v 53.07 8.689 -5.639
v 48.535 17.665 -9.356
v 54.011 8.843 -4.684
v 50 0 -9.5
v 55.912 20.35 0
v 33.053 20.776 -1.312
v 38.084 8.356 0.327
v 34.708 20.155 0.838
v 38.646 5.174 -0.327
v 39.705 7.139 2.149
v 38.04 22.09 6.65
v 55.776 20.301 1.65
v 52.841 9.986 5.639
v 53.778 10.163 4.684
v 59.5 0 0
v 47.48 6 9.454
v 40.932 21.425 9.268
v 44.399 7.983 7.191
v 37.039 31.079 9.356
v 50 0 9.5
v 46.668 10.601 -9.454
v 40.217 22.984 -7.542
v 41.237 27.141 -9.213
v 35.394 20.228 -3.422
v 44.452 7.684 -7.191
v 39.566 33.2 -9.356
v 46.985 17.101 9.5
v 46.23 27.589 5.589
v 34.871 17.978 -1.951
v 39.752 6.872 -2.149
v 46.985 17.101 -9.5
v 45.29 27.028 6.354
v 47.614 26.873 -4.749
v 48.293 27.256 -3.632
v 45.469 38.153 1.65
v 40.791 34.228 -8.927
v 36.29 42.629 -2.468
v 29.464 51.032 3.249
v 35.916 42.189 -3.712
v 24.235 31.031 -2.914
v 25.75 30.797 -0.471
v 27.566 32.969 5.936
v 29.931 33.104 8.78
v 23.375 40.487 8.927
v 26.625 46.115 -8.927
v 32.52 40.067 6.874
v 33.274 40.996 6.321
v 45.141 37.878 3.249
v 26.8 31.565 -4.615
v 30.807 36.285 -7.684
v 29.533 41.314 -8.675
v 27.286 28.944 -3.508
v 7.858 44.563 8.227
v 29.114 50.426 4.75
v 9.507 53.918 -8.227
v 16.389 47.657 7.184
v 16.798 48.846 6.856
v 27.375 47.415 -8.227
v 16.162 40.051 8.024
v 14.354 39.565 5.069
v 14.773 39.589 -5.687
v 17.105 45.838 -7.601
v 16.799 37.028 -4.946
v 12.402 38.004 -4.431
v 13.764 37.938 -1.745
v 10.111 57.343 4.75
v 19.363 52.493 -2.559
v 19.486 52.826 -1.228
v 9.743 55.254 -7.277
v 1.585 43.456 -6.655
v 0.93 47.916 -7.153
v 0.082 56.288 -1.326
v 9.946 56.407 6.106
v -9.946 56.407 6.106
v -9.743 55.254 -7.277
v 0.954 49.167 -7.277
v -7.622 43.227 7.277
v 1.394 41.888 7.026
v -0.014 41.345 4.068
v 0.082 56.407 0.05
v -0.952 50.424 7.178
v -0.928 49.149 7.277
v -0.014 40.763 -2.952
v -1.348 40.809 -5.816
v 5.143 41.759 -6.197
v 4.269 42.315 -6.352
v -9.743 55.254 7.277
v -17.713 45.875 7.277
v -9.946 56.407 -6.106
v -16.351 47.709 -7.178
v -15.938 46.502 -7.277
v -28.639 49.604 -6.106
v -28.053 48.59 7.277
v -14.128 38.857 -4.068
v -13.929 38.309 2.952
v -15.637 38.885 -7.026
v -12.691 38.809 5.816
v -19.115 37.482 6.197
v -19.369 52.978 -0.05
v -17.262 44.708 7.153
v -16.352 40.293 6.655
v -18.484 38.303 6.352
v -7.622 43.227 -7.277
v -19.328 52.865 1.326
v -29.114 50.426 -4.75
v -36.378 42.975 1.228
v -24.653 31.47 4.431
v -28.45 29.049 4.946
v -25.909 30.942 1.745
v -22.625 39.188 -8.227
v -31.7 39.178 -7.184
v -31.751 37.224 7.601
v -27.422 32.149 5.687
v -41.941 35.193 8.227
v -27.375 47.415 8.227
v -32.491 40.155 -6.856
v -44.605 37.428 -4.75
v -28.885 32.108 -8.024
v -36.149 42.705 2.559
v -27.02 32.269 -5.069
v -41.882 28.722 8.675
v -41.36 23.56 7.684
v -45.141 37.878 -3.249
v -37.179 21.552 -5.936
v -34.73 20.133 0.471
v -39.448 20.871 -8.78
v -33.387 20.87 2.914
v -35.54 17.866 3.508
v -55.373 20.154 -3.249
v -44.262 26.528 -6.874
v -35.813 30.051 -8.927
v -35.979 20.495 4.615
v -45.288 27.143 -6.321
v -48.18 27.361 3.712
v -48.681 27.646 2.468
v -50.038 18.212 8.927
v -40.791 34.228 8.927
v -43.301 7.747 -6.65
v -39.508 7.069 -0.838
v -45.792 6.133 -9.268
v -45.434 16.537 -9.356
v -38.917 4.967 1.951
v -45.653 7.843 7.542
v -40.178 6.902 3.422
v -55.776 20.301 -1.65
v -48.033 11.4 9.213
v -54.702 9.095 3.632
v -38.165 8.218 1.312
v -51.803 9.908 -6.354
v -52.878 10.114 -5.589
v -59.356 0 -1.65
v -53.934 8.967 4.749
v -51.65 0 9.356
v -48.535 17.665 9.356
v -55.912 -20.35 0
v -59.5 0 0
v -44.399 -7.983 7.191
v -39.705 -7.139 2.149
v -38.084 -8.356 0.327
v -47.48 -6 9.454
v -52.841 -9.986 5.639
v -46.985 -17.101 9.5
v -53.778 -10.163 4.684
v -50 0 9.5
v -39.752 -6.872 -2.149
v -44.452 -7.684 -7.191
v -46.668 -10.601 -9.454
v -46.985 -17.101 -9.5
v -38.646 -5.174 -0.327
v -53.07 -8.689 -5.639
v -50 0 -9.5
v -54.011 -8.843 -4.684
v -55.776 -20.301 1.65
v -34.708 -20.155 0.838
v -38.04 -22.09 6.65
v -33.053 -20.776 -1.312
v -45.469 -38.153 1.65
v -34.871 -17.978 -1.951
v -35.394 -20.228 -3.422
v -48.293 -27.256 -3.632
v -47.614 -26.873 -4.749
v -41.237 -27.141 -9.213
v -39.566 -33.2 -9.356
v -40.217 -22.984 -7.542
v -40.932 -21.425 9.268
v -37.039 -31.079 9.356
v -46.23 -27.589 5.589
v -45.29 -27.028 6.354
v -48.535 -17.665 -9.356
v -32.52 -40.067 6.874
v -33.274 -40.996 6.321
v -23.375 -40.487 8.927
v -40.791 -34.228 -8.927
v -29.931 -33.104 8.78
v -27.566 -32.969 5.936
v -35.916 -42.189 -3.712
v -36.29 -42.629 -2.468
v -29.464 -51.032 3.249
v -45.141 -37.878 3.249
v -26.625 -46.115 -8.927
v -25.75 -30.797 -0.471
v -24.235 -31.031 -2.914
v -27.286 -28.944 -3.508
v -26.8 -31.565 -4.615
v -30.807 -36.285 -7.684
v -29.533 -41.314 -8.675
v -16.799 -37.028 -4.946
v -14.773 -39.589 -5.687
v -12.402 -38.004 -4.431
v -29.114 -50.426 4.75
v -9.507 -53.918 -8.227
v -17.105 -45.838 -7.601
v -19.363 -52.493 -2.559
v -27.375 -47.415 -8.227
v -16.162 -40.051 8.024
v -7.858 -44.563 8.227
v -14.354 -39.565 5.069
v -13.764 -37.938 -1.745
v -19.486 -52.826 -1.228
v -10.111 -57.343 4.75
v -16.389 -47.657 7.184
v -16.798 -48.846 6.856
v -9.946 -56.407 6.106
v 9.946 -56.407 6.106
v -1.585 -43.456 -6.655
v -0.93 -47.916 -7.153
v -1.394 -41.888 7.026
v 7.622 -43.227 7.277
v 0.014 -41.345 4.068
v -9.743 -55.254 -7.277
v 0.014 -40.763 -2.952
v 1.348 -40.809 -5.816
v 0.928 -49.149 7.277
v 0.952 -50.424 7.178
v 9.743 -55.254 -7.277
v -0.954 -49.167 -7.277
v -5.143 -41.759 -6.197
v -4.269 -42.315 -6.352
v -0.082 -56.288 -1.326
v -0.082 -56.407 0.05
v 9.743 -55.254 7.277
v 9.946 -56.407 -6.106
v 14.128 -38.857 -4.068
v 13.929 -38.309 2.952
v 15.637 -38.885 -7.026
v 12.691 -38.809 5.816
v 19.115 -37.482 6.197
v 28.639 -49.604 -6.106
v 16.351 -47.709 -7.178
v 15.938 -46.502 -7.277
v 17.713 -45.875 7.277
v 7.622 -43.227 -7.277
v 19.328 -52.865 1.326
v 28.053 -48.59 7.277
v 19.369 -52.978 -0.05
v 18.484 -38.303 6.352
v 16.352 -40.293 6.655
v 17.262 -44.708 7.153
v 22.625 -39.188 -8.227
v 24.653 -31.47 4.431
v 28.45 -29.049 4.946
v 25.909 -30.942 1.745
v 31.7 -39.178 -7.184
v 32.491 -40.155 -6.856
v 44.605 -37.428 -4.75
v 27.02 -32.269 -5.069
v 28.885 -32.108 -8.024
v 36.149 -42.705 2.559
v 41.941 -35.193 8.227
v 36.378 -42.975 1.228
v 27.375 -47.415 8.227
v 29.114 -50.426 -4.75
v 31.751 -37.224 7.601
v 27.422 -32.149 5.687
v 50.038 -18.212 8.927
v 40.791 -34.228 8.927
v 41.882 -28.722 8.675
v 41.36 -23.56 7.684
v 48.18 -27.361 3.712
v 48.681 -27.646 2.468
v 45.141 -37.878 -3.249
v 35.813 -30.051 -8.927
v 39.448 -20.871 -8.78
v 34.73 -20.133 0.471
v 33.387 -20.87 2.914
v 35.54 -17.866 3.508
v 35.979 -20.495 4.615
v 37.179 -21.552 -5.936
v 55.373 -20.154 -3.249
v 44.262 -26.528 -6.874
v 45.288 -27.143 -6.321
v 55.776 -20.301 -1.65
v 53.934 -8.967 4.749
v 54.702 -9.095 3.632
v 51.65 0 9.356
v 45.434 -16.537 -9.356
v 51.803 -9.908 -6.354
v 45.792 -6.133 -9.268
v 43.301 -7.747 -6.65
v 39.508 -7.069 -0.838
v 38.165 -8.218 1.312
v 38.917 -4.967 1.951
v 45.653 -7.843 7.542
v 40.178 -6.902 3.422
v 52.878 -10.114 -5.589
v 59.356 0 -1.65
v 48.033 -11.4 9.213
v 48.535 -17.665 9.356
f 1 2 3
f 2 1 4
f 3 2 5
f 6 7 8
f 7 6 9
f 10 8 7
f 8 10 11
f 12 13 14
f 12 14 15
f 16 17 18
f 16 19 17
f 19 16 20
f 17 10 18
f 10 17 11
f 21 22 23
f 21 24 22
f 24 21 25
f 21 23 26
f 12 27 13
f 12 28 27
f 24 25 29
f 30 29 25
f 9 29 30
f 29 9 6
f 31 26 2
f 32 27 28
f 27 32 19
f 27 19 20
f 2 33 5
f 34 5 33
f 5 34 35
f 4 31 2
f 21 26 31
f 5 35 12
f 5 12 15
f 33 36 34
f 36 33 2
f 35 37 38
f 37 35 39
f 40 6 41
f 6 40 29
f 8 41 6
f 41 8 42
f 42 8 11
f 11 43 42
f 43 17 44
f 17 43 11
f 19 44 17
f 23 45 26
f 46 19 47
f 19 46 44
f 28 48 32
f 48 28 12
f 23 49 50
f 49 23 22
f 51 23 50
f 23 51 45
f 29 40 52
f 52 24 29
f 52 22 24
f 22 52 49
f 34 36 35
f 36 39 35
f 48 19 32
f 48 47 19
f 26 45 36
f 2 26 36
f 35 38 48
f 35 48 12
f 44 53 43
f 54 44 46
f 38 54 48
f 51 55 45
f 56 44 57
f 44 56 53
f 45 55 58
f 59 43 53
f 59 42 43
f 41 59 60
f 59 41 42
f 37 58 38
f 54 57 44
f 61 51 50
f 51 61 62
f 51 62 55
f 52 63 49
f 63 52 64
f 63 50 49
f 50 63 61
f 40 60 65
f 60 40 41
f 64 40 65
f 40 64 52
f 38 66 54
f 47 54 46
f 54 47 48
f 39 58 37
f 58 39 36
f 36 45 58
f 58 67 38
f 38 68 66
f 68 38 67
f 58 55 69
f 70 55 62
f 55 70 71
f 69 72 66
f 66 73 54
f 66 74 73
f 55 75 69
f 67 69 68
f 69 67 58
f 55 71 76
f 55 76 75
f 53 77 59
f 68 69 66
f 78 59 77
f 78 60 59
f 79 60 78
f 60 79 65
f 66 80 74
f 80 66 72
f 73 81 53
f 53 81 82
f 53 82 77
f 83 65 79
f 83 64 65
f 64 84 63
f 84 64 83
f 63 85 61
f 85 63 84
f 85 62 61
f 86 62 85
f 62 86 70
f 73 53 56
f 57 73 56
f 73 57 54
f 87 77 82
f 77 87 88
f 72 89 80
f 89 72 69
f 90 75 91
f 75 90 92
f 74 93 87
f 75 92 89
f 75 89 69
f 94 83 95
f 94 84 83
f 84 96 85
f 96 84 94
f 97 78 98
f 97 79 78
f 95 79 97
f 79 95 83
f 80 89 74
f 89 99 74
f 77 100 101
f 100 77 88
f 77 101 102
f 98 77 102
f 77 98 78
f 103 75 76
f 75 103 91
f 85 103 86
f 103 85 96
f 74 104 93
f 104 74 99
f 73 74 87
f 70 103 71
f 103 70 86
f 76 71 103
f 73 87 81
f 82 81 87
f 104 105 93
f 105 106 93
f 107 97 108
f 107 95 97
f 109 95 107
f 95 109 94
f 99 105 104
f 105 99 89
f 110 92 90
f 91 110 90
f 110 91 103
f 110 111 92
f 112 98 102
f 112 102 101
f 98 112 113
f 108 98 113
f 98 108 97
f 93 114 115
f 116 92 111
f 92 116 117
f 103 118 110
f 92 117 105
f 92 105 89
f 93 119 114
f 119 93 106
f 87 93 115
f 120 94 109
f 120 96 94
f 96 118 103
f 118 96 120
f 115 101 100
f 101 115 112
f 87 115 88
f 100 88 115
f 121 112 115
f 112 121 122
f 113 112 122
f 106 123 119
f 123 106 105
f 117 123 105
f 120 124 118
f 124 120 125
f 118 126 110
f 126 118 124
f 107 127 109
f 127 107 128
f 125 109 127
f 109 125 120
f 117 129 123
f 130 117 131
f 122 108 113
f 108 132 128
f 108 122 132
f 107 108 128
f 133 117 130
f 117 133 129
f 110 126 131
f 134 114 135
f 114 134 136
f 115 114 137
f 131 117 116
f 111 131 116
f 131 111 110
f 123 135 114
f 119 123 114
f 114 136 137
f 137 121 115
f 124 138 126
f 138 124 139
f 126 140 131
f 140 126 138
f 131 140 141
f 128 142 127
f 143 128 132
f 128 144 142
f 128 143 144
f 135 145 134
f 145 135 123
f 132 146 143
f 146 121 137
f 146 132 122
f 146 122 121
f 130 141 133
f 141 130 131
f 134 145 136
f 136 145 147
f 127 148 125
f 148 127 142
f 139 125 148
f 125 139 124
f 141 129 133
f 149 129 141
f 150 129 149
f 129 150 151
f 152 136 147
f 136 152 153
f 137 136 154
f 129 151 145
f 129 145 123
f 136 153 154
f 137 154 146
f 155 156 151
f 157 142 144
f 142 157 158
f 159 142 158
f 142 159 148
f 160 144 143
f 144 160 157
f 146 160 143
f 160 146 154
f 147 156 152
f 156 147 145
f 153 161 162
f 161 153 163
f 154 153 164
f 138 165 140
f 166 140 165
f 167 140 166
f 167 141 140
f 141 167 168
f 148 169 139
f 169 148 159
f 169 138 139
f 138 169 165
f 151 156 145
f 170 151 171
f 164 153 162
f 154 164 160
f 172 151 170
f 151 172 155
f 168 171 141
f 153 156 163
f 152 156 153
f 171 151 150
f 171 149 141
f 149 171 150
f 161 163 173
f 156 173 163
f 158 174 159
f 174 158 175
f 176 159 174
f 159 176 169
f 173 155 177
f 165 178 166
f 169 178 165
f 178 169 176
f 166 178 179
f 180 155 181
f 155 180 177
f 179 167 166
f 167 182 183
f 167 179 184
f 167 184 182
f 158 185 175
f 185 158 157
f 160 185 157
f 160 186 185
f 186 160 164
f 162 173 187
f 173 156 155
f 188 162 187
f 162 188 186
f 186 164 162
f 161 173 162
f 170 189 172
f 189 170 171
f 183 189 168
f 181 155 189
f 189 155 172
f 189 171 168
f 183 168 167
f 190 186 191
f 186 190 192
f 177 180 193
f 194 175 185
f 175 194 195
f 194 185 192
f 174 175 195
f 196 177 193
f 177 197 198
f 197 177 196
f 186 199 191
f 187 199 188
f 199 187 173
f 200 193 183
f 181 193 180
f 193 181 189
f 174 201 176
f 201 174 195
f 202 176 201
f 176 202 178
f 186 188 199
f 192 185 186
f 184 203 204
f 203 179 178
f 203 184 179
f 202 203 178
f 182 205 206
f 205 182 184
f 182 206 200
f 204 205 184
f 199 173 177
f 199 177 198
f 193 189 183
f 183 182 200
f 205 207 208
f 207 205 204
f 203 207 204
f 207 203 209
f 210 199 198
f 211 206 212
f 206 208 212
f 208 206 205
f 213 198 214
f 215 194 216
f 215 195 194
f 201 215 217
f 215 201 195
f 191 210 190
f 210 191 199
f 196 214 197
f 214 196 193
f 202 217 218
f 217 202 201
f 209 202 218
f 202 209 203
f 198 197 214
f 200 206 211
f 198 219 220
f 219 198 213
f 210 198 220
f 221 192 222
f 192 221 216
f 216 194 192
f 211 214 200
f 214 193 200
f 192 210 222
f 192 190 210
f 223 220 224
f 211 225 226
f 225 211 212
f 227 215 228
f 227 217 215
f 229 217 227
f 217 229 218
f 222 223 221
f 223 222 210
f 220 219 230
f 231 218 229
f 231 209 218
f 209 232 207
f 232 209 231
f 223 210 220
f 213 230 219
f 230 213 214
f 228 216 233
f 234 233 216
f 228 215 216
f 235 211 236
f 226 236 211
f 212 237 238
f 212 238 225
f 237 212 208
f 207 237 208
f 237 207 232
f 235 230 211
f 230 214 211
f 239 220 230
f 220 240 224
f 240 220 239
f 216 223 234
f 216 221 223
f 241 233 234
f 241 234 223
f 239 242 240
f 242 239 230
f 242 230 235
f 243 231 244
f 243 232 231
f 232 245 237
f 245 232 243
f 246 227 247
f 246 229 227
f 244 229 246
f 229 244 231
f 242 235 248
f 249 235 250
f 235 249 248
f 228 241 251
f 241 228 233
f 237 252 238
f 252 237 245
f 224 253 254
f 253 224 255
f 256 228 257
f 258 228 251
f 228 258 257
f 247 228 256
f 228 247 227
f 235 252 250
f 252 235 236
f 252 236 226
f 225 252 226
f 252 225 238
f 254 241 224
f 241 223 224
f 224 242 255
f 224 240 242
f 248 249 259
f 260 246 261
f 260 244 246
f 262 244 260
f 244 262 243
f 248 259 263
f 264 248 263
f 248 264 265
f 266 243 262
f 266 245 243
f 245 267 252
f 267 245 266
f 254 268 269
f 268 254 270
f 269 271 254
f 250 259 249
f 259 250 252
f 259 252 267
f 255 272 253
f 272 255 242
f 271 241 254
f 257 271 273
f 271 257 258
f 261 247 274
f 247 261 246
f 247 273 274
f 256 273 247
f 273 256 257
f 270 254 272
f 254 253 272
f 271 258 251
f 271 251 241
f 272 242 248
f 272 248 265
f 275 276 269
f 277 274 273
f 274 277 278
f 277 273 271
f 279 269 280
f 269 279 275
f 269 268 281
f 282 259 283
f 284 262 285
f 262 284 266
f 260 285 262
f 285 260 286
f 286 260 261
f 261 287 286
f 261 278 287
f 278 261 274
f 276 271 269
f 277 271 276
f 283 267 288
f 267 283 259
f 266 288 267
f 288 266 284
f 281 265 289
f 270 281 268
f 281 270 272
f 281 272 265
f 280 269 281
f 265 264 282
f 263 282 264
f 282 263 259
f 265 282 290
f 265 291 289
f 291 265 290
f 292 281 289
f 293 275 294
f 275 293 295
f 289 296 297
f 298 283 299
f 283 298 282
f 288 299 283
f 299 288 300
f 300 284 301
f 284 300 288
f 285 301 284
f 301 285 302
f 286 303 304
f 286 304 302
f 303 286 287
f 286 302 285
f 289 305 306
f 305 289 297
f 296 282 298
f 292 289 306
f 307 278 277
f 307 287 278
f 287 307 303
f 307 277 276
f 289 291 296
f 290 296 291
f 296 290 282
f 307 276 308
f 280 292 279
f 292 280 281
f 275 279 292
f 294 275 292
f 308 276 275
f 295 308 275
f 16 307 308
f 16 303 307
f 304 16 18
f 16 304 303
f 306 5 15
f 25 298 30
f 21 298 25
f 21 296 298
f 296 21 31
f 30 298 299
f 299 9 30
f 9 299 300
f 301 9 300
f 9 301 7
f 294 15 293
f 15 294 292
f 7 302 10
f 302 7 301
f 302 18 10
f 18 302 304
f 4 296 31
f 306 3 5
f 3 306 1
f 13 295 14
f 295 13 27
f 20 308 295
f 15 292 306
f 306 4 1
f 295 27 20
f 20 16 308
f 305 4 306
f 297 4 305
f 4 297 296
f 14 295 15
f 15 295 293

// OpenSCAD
/*Polygon-möbius-strip generator by Mixomycetes
*Licence: CC non-commercial
*
* Inspired by Twistypuzzle forum and
* mobius_polygon(n,m)
*
* v1: functional mobius_polygon();
* v2: Used pie library to implement Angle_to_keep_in_STL <360;
* v3: added twisty_puzzle pieces();
* v4: rebuild with steps using children(). Much faster.
* v5: implemented my_pieslice instead of pie;
* v6: smooth output available (hull of every 2 adjencent pieces)
* v7: accepts any 2D polygon as input for rotation. 
* v8: some cleanup.
*******************************
*/

//Number of edges of rotated polygon.
NEdges = 4; //[1:20]

//Number of full twists over one ring turn.Make negative to reverse chirality. n/m fractions possible too
Twists  = 2/4;  
// Diameter of polygon (circumscribed)
Width_strip= 19; 
 // Diameter of total ring
Size_ring = 100; //should be larger than width_strip.

// Angle to print. May need to make multiple rotations (>360), when NEdges/Twist is non-integer.
Angle_to_form_shape = 360; // [0:720]

// Typically 360, smaller if you want to keep only a fraction. Note that it slows things down considerably!
Angle_to_keep_in_STL = 360; // [0:360]
// Angle of polygon at X-axis. Mainly important for Twists =0
Start_angle = 0;

Make_empty_centre_ring = 0; // [1:Yes,0:No]

//FULL centre hole diameter. Should be smaller than Width_strip.
Diameter_hollow_centre =5; 

// Angle-section of each segment
Stepsize=20; 

smoothed = 1; // 1: uses a hull between every 2 items. 0 doesn't. 0 is faster, 1 nicer.
// the lower the faster, but higher means nicer
fn = 5;


/** Begin of program **/
    
//Some simple shapes/features:
//mobius_strip(20,4,0.1);
mobius_polygon(NEdges,Twists,Width_strip,Size_ring,fn,Angle_to_form_shape,Start_angle,Stepsize,Angle_to_keep_in_STL,Make_empty_centre_ring,Diameter_hollow_centre,smoothed);

//rotate_step_by_step(Twists,Stepsize,Angle_to_form_shape,0,20,0,1)ngon(20)
//nparts = 4;
//points = [[0,0],[-1,1],[1,-1],[1,1]]*Width_strip/2;
//georgehart_mobius_centre_v1(nparts,points,TiltAngle=20);

/** Modules **/

module georgehart_mobius_centre_v1(nparts,points,TiltAngle=20){
// n_gon: points = 
CentreAngle = 360/nparts;

union(){
    for (i = [0:nparts-1]){
rotate([0,TiltAngle,i*CentreAngle])translate([0,Size_ring/4,0])  rotate_step_by_step(Twists,1,Angle_to_form_shape,0,Size_ring,1) polygon(points);
};
};
};


module mobius_polygon(NEdges=5,Twists=0,Width_strip=1,Size_ring=10,fn=10,Angle_to_form_shape =360,Start_angle=0,Stepsize=5,Angle_to_keep_in_STL=360,Make_empty_centre_ring=0,Diameter_hollow_centre=0,smoothed=0){
steps_obsolete=Angle_to_form_shape/Stepsize; 
  steps=360/Stepsize; // a step per 5°, faster than per 1°
intersection(){ //keep just a pieslice    
    if (Angle_to_keep_in_STL<360) {
        safetymargin=3; // default 3
   translate([0,0,-Width_strip/2*safetymargin]) mypie(Size_ring/2*safetymargin+Width_strip/2*safetymargin, Width_strip*safetymargin, Angle_to_keep_in_STL, spin=0);
    };
    
difference(){ 
//make main shape
if (NEdges==2){
    thickness = 1;
    // available for backward compatibility    
    mobius_strip(Size_ring/2,Width_strip,thickness,Twists/2,Stepsize,Start_angle);
     };   

    
if (NEdges>2){
                
rotate([0,0,Start_angle]) rotate_step_by_step(Twists,Stepsize,Angle_to_form_shape,smoothed,Size_ring) circle(d=Width_strip,$fn=NEdges);
    };
  
    // cut out centre ring.
if (  Make_empty_centre_ring==1 ){
    rotate_extrude($fn=fn)translate([Size_ring/2,0,0])circle(d=Diameter_hollow_centre,$fn=fn);
};

};
};
};


// some helper functions:
module ngon(diam=10, fn=6){
//rotate([90,0,0])    linear_extrude(thickness)
    circle(d=diam,$fn=fn);
    }; // in XZ-plane, needed positive X for rotate-extrude! => translate([diam,0])


module rotate_step_by_step(Twists=0,Stepsize=5,To_angle=360,smoothed =0,Size_ring=50,From_angle=0){// iterative rotate_extrude of 2D child. (Sv7)
    // Much Faster, but creates more coordinates.
    // children shapes should be within a Size_ring/2 circle.
     // OneStepAngle_wrong =Angle_to_form_shape/Stepsize; // a step per 5°, faster 
        if (smoothed==1)
    for (step = [From_angle:Stepsize:To_angle-Stepsize]){
            hull(){rotate([0,0,step]) rotate_extrude(angle = Stepsize, convexity = 2) translate([Size_ring/2,0,0]) rotate([0,0,step *Twists])       children();
    rotate([0,0,step+Stepsize]) rotate_extrude(angle = Stepsize, convexity = 2) translate([Size_ring/2,0,0]) rotate([0,0,(step+Stepsize) *Twists])        children();
            };
};  
            if (smoothed==0){
    for (step = [From_angle:Stepsize:To_angle-Stepsize]){
            rotate([0,0,step]) rotate_extrude(angle = Stepsize, convexity = 2)translate([Size_ring/2,0,0]) rotate([0,0,step *Twists])        children();
            };  
};  
};


module mobius_strip(radius=20,width=5,thickness=1,twist=1,step=1, ,start=90){ // original code by Kitwallace
    
   // Original_code_by_kitwallace
   //source:    http://www.thingiverse.com/thing:239158/#files
    // Mobius strip
   
Halftwist =twist/2;
Delta= 0.01;

  for (i = [0:step:360])
    hull() {
       rotate([0,0,i])
          translate([radius,0,0])
             rotate([0,start+i * Halftwist, 0]) 
               cube([width,Delta,thickness], center=true);
       rotate([0,0,i+step])
          translate([radius,0,0])
             rotate([0,start+(i+step)* Halftwist , 0]) 
               cube([width,Delta,thickness], center=true);
       }
};

    
    


module thorus(Size_ring=10,Diameter_hollow_centre=5,fn=5){ // simple thorus
rotate_extrude(,$fn=fn)translate([Size_ring/2,0,0])circle(d=Diameter_hollow_centre,$fn=fn);
    };

module mypie(radius,height,pieangle,spin){
rotate_extrude(angle=pieangle,$fn=fn)square(size =[radius,height],centre=false);
};
    
